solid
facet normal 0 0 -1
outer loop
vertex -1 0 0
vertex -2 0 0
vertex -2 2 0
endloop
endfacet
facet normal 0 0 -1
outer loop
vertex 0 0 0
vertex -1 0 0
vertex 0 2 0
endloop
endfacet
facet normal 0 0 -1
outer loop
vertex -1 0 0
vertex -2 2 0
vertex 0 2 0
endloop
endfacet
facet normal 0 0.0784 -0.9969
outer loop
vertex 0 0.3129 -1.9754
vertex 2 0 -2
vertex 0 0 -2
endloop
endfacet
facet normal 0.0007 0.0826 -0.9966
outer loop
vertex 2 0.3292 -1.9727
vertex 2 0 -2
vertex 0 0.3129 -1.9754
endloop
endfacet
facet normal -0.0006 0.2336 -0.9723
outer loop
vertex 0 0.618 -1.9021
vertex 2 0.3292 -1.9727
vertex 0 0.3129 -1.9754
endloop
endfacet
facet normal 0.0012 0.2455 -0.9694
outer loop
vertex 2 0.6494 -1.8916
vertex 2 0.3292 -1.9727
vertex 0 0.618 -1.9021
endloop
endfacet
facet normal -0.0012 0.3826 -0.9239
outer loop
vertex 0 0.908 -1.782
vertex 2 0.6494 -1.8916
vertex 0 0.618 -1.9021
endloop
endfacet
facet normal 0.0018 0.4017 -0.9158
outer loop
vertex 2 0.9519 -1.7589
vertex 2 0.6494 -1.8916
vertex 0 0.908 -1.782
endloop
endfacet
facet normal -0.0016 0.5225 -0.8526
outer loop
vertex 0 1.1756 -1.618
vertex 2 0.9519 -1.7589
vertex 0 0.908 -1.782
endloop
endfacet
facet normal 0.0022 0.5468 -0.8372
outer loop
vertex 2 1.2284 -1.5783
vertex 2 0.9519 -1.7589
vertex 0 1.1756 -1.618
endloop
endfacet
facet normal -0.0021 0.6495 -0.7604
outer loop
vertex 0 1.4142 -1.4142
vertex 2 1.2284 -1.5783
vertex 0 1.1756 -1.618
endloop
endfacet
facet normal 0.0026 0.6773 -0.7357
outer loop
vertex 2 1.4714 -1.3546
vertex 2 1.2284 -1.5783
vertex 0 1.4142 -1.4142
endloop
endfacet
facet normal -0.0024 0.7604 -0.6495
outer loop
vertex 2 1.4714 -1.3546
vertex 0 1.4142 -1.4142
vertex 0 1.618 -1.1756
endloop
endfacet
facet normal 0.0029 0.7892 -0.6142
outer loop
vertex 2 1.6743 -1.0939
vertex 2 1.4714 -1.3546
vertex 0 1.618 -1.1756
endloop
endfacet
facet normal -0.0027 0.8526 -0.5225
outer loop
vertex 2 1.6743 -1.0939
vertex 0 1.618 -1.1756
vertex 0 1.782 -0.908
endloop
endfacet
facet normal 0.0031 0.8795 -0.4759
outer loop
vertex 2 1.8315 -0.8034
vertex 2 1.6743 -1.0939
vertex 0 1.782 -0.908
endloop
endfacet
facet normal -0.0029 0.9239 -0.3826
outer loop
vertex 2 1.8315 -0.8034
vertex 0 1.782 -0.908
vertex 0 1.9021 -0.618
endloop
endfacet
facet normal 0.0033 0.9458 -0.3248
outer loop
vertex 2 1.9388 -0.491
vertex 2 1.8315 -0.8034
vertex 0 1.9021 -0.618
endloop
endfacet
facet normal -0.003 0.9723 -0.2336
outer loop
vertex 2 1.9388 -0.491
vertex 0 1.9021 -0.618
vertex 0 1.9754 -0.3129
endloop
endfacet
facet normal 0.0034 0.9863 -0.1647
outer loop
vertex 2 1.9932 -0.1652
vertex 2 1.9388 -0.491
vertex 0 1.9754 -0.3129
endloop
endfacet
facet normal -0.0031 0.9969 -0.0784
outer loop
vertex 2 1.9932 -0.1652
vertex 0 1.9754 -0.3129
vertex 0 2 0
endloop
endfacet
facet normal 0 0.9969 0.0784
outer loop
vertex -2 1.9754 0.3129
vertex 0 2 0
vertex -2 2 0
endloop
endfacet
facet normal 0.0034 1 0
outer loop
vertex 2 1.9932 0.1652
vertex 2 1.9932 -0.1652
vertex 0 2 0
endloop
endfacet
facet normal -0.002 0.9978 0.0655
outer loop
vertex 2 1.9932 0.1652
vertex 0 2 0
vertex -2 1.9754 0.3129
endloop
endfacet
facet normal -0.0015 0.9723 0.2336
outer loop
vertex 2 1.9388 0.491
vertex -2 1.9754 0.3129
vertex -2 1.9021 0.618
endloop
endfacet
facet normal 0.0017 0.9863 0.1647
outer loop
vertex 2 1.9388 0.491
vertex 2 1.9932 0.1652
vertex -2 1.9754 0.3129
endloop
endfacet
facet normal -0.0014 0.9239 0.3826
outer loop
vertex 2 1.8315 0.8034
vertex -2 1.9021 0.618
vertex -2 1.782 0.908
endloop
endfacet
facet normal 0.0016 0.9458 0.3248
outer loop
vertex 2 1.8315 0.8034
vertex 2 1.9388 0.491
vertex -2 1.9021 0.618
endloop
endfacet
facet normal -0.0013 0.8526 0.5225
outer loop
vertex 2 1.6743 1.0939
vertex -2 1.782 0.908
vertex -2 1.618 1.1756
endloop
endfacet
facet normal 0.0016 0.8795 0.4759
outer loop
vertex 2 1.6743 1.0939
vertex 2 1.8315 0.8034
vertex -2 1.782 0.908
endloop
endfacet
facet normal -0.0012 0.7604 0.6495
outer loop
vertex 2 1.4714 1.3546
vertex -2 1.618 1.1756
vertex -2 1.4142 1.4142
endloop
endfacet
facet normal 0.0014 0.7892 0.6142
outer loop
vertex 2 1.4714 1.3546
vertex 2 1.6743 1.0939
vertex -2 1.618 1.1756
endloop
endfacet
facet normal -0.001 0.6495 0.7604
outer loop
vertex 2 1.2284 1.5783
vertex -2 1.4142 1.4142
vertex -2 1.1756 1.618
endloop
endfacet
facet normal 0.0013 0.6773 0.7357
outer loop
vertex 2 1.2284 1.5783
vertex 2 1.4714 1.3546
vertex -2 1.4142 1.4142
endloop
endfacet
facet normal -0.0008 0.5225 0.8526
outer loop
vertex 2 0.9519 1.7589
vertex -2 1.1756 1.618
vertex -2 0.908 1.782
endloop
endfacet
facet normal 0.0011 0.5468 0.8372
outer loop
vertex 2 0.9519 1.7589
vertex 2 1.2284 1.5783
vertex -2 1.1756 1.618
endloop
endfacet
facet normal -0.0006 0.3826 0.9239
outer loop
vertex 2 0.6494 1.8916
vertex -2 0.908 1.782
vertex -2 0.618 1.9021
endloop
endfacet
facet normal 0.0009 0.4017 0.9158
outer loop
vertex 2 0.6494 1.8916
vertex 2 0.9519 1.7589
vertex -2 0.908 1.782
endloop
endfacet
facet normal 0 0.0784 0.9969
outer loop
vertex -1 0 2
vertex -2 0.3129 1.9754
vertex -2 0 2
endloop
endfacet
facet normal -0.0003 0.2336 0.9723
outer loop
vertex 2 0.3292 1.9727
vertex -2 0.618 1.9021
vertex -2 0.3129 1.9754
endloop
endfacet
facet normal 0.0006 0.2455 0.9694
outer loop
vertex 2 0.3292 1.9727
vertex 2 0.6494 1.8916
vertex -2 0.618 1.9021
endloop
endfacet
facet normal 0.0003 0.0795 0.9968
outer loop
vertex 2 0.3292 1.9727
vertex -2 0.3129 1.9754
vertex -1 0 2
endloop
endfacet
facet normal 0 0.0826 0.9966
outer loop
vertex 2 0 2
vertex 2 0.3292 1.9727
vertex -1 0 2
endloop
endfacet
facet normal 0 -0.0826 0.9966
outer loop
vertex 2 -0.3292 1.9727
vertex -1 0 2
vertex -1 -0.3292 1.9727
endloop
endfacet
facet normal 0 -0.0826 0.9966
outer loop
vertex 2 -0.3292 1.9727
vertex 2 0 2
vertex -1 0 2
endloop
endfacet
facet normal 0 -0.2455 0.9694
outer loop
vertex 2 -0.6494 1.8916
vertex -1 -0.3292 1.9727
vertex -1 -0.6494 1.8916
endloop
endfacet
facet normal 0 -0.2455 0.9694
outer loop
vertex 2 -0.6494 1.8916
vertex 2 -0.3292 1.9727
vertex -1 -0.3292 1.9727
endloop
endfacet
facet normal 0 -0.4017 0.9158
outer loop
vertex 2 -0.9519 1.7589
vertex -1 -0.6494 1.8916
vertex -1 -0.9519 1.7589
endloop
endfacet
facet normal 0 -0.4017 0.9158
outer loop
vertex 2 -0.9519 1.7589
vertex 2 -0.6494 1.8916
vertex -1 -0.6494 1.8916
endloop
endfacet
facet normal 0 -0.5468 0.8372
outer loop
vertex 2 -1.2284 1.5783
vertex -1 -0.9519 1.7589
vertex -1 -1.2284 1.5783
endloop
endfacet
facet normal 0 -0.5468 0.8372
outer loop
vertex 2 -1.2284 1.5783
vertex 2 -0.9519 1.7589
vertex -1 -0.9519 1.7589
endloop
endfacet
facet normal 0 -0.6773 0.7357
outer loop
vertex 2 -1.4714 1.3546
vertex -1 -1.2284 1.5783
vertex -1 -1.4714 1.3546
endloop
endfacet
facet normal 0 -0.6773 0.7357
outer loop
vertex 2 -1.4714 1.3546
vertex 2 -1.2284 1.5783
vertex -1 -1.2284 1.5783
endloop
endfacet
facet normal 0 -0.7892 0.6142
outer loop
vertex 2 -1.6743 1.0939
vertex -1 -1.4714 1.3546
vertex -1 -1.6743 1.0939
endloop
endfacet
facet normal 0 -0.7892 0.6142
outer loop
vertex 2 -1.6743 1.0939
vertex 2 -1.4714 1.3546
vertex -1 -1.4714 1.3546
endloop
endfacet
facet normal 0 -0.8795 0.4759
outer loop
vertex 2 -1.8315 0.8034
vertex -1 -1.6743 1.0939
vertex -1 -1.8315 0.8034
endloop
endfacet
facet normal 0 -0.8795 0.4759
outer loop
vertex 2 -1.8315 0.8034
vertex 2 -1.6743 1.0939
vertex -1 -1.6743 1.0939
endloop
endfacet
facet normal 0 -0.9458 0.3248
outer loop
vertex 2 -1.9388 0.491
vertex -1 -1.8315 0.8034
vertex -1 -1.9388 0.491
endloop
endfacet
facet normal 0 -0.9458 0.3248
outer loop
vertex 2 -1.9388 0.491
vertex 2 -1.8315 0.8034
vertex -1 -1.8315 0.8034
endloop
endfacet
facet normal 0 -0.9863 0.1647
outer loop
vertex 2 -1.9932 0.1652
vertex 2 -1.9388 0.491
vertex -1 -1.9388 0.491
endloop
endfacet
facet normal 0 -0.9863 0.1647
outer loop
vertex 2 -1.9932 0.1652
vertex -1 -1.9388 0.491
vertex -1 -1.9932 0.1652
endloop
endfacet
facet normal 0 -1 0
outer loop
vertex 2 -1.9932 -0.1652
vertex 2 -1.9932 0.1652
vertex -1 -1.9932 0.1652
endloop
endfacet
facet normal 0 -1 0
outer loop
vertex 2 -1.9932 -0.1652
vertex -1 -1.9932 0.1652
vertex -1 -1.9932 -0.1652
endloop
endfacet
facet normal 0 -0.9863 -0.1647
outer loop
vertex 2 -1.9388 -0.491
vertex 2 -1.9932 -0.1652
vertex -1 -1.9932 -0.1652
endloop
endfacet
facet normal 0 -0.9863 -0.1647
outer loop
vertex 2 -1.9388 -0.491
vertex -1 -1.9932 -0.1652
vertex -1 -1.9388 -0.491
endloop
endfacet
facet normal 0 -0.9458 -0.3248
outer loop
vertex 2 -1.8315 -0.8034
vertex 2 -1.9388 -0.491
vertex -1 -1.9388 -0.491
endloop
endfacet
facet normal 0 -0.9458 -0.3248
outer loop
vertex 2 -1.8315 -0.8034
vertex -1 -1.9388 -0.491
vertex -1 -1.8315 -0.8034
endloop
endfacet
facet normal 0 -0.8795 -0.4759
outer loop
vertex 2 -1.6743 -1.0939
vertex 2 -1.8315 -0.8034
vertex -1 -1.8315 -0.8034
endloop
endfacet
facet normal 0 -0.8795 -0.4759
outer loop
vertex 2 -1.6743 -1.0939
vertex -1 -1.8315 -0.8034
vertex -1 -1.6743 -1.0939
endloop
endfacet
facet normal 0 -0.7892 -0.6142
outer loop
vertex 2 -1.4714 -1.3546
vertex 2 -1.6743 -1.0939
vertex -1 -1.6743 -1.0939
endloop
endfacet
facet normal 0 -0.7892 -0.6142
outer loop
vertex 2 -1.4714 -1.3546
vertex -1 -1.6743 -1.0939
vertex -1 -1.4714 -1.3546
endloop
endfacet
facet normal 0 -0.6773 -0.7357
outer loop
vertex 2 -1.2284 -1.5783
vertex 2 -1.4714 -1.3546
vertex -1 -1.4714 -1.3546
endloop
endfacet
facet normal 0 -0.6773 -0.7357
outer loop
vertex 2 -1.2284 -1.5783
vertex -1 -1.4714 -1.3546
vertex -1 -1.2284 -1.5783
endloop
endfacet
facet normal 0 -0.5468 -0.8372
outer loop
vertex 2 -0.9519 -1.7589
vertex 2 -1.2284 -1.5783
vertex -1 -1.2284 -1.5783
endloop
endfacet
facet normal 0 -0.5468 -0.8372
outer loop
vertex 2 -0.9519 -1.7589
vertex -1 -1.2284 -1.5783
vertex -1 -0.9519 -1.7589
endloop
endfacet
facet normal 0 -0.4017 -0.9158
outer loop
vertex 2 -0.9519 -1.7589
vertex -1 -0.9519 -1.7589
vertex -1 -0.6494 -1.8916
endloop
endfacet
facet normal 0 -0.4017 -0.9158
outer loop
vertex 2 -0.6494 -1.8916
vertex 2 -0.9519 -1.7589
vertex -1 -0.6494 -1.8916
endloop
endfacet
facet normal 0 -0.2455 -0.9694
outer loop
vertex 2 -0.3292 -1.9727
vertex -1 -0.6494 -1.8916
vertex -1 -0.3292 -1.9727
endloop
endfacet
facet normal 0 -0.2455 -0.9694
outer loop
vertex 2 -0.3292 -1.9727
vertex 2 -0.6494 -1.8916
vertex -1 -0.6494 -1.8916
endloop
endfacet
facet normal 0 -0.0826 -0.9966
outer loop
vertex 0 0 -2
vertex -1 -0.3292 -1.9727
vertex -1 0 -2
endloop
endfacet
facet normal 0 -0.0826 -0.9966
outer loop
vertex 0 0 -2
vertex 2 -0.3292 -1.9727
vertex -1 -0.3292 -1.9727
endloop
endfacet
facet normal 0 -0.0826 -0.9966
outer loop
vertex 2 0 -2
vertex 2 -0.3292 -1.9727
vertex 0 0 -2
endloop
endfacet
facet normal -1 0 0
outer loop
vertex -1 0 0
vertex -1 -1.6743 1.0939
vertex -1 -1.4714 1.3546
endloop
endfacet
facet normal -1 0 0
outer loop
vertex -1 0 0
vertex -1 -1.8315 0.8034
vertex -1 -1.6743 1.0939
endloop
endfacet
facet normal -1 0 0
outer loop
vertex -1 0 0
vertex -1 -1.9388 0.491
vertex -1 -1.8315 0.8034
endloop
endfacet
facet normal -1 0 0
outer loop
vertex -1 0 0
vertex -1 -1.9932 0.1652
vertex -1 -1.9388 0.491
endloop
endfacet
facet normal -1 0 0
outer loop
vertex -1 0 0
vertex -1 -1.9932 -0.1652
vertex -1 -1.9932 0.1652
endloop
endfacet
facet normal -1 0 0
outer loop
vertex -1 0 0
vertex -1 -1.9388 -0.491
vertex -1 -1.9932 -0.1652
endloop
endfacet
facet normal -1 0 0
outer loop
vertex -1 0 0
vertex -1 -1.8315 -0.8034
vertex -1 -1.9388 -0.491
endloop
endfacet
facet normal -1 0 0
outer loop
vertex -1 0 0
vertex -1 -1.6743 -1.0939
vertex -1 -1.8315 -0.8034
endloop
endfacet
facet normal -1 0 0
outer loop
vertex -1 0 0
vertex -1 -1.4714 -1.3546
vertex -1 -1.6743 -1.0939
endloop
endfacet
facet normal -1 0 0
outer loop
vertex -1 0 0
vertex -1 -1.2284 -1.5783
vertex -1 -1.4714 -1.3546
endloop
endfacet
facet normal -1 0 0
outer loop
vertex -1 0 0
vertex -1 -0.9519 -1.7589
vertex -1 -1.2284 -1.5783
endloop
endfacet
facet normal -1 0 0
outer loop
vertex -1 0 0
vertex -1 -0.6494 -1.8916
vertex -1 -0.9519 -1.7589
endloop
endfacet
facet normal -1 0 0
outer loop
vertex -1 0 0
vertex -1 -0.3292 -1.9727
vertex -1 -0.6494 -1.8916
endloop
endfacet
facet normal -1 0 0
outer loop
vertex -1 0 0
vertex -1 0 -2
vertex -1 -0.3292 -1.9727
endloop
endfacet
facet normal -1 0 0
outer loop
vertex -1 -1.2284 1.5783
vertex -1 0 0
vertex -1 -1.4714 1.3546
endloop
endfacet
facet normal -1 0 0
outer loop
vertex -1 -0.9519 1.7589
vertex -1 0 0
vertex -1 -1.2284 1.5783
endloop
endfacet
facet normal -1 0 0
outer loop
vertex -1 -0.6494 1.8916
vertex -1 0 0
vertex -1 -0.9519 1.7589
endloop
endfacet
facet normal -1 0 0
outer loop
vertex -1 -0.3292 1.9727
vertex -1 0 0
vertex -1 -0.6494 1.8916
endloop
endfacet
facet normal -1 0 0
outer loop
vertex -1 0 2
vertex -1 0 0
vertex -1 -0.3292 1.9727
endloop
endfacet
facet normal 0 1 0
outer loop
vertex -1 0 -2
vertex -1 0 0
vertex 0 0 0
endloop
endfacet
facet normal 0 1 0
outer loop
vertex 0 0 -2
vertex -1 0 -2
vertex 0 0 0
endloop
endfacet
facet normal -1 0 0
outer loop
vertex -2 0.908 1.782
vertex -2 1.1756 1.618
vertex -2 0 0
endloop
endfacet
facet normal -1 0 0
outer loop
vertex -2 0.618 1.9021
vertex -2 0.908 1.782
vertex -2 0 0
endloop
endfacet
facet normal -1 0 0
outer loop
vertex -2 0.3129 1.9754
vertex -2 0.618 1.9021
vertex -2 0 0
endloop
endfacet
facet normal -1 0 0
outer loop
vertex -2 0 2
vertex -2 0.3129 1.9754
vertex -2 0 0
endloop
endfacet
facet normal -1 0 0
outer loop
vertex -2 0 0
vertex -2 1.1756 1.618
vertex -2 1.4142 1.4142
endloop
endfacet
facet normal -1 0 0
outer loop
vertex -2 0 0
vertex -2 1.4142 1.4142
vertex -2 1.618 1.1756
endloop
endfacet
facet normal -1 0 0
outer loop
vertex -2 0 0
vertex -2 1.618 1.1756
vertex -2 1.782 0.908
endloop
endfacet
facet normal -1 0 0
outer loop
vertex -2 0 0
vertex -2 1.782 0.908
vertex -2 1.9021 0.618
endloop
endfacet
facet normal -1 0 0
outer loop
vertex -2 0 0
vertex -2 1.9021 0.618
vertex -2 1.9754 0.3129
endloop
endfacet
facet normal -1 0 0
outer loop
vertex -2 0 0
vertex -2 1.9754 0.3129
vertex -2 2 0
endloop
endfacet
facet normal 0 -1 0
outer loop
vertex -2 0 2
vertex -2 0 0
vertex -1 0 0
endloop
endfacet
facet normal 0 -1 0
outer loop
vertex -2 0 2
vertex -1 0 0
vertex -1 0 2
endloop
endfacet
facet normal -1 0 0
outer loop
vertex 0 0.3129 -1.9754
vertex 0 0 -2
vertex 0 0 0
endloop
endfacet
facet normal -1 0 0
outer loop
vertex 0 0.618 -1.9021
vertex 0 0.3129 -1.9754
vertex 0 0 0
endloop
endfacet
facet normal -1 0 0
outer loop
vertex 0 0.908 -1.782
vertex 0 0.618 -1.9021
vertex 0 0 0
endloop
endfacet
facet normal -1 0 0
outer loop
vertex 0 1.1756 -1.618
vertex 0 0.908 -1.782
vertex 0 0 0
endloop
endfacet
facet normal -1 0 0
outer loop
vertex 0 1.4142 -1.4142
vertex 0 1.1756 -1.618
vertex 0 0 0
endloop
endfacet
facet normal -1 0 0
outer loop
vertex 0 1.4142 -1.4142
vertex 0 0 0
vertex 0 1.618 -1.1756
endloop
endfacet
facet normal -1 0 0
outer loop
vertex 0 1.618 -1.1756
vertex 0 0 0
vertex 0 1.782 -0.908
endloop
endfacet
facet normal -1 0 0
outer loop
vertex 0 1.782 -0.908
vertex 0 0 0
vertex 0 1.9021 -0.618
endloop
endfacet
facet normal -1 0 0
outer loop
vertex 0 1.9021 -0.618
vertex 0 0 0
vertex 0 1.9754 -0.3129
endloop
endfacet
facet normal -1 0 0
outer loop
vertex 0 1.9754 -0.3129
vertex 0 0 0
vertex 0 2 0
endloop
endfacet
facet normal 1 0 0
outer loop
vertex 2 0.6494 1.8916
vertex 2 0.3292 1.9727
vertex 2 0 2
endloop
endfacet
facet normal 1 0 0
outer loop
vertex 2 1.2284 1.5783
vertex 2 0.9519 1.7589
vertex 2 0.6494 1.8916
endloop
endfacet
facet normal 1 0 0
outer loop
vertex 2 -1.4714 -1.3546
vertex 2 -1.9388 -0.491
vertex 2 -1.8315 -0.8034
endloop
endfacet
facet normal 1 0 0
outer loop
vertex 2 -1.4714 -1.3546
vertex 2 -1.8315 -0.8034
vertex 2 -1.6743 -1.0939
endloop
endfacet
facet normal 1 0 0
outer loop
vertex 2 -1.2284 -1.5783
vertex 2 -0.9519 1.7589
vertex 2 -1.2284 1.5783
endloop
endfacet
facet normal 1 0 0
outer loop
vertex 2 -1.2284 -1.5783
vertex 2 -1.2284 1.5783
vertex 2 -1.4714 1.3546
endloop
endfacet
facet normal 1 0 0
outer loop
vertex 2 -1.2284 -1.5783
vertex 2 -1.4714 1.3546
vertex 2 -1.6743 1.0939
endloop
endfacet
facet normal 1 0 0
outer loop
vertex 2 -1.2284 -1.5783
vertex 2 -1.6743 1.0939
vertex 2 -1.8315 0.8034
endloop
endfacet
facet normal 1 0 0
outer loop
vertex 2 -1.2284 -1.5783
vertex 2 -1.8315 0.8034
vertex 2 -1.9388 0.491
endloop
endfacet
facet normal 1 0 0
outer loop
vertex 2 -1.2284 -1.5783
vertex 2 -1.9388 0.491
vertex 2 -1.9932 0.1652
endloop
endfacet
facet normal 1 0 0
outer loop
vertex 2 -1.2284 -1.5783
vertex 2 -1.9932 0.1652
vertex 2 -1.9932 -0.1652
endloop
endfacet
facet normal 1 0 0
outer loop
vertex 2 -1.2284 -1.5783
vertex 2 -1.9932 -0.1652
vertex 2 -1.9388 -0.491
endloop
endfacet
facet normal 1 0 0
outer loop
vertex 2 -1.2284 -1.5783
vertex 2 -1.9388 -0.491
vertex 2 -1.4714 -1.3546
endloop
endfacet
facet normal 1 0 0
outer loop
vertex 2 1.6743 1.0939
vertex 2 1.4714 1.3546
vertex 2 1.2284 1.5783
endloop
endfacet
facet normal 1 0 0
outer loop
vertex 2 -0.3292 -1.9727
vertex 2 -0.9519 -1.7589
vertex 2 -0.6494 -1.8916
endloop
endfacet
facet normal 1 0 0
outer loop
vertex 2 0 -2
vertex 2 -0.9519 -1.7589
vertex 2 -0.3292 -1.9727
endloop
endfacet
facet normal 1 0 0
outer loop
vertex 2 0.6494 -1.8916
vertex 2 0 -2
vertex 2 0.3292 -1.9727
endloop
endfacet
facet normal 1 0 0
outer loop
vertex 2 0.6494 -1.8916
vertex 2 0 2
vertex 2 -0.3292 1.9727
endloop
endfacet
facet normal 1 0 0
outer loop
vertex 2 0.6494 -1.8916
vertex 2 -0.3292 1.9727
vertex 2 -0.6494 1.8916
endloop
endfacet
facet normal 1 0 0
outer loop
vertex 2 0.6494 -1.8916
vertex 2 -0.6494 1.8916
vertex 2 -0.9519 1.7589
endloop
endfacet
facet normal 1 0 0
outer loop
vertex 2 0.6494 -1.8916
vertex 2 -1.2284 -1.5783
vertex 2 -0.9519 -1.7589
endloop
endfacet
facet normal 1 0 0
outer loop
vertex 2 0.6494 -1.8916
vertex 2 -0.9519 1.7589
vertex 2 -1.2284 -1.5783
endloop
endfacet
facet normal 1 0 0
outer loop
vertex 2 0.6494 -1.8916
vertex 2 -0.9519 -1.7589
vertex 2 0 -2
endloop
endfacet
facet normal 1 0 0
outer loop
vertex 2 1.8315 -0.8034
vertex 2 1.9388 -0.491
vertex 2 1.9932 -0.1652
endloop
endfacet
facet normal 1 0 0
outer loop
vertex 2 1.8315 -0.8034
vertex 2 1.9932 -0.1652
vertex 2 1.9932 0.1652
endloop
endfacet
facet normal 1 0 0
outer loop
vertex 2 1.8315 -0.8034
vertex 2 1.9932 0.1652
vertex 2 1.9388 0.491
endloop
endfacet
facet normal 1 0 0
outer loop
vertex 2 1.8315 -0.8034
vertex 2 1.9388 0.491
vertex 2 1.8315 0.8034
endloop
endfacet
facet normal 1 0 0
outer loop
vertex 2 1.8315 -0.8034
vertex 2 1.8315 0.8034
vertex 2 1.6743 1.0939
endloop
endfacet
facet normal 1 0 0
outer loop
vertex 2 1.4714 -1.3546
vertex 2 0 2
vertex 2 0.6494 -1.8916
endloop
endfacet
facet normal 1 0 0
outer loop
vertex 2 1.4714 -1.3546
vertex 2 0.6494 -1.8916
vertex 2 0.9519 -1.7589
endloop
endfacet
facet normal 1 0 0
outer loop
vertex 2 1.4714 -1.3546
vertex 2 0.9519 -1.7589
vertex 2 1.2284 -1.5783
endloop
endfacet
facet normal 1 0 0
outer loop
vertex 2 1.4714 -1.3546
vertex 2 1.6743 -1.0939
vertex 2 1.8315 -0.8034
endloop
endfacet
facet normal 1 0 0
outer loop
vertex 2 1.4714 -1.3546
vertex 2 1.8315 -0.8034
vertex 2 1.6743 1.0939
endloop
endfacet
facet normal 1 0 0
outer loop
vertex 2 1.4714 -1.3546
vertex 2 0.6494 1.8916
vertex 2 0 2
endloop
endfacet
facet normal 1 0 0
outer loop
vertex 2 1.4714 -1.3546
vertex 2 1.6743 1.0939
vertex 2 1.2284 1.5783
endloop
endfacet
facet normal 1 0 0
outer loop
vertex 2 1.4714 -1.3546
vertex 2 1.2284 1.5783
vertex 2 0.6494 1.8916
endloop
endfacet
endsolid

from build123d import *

# Parameters (mm, degrees)
SKETCH1_R           = 2
BOSS_EXTRUDE1_DEPTH = 2
SKETCH2_W           = 2
SKETCH2_H           = 2
CUT_EXTRUDE1_DEPTH  = 4
SKETCH3_W           = 4.29522536
SKETCH3_H           = 2.132813924
CUT_EXTRUDE2_DEPTH  = 1


with BuildPart() as part:
    # Sketch1 → Boss-Extrude1 (new body, symmetric)
    with BuildSketch(Plane(origin=(0, 0, 0), x_dir=(0, 0, -1), z_dir=(1, 0, 0))):
        Circle(SKETCH1_R)
    extrude(amount=BOSS_EXTRUDE1_DEPTH, both=True)

    # Sketch2 → Cut-Extrude1 (cut)
    with BuildSketch(Plane.XY):
        with Locations((-1, 1)):
            Rectangle(SKETCH2_W, SKETCH2_H)
    extrude(amount=-CUT_EXTRUDE1_DEPTH, mode=Mode.SUBTRACT)

    # Sketch3 → Cut-Extrude2 (cut)
    with BuildSketch(Plane.ZY.offset(2)):
        with Locations((0.14761268, -1.066406962)):
            Rectangle(SKETCH3_W, SKETCH3_H)
    extrude(amount=-CUT_EXTRUDE2_DEPTH, mode=Mode.SUBTRACT)


solid = part.part
